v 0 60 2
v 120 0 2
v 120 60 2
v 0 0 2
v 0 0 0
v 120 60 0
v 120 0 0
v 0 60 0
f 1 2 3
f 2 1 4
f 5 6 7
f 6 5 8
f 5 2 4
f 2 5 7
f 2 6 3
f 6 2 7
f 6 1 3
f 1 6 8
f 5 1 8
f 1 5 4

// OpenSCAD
// Skeleton Code for UF EGN 4932

module main() {
    cube([120, 60, 2]);
}

main();
